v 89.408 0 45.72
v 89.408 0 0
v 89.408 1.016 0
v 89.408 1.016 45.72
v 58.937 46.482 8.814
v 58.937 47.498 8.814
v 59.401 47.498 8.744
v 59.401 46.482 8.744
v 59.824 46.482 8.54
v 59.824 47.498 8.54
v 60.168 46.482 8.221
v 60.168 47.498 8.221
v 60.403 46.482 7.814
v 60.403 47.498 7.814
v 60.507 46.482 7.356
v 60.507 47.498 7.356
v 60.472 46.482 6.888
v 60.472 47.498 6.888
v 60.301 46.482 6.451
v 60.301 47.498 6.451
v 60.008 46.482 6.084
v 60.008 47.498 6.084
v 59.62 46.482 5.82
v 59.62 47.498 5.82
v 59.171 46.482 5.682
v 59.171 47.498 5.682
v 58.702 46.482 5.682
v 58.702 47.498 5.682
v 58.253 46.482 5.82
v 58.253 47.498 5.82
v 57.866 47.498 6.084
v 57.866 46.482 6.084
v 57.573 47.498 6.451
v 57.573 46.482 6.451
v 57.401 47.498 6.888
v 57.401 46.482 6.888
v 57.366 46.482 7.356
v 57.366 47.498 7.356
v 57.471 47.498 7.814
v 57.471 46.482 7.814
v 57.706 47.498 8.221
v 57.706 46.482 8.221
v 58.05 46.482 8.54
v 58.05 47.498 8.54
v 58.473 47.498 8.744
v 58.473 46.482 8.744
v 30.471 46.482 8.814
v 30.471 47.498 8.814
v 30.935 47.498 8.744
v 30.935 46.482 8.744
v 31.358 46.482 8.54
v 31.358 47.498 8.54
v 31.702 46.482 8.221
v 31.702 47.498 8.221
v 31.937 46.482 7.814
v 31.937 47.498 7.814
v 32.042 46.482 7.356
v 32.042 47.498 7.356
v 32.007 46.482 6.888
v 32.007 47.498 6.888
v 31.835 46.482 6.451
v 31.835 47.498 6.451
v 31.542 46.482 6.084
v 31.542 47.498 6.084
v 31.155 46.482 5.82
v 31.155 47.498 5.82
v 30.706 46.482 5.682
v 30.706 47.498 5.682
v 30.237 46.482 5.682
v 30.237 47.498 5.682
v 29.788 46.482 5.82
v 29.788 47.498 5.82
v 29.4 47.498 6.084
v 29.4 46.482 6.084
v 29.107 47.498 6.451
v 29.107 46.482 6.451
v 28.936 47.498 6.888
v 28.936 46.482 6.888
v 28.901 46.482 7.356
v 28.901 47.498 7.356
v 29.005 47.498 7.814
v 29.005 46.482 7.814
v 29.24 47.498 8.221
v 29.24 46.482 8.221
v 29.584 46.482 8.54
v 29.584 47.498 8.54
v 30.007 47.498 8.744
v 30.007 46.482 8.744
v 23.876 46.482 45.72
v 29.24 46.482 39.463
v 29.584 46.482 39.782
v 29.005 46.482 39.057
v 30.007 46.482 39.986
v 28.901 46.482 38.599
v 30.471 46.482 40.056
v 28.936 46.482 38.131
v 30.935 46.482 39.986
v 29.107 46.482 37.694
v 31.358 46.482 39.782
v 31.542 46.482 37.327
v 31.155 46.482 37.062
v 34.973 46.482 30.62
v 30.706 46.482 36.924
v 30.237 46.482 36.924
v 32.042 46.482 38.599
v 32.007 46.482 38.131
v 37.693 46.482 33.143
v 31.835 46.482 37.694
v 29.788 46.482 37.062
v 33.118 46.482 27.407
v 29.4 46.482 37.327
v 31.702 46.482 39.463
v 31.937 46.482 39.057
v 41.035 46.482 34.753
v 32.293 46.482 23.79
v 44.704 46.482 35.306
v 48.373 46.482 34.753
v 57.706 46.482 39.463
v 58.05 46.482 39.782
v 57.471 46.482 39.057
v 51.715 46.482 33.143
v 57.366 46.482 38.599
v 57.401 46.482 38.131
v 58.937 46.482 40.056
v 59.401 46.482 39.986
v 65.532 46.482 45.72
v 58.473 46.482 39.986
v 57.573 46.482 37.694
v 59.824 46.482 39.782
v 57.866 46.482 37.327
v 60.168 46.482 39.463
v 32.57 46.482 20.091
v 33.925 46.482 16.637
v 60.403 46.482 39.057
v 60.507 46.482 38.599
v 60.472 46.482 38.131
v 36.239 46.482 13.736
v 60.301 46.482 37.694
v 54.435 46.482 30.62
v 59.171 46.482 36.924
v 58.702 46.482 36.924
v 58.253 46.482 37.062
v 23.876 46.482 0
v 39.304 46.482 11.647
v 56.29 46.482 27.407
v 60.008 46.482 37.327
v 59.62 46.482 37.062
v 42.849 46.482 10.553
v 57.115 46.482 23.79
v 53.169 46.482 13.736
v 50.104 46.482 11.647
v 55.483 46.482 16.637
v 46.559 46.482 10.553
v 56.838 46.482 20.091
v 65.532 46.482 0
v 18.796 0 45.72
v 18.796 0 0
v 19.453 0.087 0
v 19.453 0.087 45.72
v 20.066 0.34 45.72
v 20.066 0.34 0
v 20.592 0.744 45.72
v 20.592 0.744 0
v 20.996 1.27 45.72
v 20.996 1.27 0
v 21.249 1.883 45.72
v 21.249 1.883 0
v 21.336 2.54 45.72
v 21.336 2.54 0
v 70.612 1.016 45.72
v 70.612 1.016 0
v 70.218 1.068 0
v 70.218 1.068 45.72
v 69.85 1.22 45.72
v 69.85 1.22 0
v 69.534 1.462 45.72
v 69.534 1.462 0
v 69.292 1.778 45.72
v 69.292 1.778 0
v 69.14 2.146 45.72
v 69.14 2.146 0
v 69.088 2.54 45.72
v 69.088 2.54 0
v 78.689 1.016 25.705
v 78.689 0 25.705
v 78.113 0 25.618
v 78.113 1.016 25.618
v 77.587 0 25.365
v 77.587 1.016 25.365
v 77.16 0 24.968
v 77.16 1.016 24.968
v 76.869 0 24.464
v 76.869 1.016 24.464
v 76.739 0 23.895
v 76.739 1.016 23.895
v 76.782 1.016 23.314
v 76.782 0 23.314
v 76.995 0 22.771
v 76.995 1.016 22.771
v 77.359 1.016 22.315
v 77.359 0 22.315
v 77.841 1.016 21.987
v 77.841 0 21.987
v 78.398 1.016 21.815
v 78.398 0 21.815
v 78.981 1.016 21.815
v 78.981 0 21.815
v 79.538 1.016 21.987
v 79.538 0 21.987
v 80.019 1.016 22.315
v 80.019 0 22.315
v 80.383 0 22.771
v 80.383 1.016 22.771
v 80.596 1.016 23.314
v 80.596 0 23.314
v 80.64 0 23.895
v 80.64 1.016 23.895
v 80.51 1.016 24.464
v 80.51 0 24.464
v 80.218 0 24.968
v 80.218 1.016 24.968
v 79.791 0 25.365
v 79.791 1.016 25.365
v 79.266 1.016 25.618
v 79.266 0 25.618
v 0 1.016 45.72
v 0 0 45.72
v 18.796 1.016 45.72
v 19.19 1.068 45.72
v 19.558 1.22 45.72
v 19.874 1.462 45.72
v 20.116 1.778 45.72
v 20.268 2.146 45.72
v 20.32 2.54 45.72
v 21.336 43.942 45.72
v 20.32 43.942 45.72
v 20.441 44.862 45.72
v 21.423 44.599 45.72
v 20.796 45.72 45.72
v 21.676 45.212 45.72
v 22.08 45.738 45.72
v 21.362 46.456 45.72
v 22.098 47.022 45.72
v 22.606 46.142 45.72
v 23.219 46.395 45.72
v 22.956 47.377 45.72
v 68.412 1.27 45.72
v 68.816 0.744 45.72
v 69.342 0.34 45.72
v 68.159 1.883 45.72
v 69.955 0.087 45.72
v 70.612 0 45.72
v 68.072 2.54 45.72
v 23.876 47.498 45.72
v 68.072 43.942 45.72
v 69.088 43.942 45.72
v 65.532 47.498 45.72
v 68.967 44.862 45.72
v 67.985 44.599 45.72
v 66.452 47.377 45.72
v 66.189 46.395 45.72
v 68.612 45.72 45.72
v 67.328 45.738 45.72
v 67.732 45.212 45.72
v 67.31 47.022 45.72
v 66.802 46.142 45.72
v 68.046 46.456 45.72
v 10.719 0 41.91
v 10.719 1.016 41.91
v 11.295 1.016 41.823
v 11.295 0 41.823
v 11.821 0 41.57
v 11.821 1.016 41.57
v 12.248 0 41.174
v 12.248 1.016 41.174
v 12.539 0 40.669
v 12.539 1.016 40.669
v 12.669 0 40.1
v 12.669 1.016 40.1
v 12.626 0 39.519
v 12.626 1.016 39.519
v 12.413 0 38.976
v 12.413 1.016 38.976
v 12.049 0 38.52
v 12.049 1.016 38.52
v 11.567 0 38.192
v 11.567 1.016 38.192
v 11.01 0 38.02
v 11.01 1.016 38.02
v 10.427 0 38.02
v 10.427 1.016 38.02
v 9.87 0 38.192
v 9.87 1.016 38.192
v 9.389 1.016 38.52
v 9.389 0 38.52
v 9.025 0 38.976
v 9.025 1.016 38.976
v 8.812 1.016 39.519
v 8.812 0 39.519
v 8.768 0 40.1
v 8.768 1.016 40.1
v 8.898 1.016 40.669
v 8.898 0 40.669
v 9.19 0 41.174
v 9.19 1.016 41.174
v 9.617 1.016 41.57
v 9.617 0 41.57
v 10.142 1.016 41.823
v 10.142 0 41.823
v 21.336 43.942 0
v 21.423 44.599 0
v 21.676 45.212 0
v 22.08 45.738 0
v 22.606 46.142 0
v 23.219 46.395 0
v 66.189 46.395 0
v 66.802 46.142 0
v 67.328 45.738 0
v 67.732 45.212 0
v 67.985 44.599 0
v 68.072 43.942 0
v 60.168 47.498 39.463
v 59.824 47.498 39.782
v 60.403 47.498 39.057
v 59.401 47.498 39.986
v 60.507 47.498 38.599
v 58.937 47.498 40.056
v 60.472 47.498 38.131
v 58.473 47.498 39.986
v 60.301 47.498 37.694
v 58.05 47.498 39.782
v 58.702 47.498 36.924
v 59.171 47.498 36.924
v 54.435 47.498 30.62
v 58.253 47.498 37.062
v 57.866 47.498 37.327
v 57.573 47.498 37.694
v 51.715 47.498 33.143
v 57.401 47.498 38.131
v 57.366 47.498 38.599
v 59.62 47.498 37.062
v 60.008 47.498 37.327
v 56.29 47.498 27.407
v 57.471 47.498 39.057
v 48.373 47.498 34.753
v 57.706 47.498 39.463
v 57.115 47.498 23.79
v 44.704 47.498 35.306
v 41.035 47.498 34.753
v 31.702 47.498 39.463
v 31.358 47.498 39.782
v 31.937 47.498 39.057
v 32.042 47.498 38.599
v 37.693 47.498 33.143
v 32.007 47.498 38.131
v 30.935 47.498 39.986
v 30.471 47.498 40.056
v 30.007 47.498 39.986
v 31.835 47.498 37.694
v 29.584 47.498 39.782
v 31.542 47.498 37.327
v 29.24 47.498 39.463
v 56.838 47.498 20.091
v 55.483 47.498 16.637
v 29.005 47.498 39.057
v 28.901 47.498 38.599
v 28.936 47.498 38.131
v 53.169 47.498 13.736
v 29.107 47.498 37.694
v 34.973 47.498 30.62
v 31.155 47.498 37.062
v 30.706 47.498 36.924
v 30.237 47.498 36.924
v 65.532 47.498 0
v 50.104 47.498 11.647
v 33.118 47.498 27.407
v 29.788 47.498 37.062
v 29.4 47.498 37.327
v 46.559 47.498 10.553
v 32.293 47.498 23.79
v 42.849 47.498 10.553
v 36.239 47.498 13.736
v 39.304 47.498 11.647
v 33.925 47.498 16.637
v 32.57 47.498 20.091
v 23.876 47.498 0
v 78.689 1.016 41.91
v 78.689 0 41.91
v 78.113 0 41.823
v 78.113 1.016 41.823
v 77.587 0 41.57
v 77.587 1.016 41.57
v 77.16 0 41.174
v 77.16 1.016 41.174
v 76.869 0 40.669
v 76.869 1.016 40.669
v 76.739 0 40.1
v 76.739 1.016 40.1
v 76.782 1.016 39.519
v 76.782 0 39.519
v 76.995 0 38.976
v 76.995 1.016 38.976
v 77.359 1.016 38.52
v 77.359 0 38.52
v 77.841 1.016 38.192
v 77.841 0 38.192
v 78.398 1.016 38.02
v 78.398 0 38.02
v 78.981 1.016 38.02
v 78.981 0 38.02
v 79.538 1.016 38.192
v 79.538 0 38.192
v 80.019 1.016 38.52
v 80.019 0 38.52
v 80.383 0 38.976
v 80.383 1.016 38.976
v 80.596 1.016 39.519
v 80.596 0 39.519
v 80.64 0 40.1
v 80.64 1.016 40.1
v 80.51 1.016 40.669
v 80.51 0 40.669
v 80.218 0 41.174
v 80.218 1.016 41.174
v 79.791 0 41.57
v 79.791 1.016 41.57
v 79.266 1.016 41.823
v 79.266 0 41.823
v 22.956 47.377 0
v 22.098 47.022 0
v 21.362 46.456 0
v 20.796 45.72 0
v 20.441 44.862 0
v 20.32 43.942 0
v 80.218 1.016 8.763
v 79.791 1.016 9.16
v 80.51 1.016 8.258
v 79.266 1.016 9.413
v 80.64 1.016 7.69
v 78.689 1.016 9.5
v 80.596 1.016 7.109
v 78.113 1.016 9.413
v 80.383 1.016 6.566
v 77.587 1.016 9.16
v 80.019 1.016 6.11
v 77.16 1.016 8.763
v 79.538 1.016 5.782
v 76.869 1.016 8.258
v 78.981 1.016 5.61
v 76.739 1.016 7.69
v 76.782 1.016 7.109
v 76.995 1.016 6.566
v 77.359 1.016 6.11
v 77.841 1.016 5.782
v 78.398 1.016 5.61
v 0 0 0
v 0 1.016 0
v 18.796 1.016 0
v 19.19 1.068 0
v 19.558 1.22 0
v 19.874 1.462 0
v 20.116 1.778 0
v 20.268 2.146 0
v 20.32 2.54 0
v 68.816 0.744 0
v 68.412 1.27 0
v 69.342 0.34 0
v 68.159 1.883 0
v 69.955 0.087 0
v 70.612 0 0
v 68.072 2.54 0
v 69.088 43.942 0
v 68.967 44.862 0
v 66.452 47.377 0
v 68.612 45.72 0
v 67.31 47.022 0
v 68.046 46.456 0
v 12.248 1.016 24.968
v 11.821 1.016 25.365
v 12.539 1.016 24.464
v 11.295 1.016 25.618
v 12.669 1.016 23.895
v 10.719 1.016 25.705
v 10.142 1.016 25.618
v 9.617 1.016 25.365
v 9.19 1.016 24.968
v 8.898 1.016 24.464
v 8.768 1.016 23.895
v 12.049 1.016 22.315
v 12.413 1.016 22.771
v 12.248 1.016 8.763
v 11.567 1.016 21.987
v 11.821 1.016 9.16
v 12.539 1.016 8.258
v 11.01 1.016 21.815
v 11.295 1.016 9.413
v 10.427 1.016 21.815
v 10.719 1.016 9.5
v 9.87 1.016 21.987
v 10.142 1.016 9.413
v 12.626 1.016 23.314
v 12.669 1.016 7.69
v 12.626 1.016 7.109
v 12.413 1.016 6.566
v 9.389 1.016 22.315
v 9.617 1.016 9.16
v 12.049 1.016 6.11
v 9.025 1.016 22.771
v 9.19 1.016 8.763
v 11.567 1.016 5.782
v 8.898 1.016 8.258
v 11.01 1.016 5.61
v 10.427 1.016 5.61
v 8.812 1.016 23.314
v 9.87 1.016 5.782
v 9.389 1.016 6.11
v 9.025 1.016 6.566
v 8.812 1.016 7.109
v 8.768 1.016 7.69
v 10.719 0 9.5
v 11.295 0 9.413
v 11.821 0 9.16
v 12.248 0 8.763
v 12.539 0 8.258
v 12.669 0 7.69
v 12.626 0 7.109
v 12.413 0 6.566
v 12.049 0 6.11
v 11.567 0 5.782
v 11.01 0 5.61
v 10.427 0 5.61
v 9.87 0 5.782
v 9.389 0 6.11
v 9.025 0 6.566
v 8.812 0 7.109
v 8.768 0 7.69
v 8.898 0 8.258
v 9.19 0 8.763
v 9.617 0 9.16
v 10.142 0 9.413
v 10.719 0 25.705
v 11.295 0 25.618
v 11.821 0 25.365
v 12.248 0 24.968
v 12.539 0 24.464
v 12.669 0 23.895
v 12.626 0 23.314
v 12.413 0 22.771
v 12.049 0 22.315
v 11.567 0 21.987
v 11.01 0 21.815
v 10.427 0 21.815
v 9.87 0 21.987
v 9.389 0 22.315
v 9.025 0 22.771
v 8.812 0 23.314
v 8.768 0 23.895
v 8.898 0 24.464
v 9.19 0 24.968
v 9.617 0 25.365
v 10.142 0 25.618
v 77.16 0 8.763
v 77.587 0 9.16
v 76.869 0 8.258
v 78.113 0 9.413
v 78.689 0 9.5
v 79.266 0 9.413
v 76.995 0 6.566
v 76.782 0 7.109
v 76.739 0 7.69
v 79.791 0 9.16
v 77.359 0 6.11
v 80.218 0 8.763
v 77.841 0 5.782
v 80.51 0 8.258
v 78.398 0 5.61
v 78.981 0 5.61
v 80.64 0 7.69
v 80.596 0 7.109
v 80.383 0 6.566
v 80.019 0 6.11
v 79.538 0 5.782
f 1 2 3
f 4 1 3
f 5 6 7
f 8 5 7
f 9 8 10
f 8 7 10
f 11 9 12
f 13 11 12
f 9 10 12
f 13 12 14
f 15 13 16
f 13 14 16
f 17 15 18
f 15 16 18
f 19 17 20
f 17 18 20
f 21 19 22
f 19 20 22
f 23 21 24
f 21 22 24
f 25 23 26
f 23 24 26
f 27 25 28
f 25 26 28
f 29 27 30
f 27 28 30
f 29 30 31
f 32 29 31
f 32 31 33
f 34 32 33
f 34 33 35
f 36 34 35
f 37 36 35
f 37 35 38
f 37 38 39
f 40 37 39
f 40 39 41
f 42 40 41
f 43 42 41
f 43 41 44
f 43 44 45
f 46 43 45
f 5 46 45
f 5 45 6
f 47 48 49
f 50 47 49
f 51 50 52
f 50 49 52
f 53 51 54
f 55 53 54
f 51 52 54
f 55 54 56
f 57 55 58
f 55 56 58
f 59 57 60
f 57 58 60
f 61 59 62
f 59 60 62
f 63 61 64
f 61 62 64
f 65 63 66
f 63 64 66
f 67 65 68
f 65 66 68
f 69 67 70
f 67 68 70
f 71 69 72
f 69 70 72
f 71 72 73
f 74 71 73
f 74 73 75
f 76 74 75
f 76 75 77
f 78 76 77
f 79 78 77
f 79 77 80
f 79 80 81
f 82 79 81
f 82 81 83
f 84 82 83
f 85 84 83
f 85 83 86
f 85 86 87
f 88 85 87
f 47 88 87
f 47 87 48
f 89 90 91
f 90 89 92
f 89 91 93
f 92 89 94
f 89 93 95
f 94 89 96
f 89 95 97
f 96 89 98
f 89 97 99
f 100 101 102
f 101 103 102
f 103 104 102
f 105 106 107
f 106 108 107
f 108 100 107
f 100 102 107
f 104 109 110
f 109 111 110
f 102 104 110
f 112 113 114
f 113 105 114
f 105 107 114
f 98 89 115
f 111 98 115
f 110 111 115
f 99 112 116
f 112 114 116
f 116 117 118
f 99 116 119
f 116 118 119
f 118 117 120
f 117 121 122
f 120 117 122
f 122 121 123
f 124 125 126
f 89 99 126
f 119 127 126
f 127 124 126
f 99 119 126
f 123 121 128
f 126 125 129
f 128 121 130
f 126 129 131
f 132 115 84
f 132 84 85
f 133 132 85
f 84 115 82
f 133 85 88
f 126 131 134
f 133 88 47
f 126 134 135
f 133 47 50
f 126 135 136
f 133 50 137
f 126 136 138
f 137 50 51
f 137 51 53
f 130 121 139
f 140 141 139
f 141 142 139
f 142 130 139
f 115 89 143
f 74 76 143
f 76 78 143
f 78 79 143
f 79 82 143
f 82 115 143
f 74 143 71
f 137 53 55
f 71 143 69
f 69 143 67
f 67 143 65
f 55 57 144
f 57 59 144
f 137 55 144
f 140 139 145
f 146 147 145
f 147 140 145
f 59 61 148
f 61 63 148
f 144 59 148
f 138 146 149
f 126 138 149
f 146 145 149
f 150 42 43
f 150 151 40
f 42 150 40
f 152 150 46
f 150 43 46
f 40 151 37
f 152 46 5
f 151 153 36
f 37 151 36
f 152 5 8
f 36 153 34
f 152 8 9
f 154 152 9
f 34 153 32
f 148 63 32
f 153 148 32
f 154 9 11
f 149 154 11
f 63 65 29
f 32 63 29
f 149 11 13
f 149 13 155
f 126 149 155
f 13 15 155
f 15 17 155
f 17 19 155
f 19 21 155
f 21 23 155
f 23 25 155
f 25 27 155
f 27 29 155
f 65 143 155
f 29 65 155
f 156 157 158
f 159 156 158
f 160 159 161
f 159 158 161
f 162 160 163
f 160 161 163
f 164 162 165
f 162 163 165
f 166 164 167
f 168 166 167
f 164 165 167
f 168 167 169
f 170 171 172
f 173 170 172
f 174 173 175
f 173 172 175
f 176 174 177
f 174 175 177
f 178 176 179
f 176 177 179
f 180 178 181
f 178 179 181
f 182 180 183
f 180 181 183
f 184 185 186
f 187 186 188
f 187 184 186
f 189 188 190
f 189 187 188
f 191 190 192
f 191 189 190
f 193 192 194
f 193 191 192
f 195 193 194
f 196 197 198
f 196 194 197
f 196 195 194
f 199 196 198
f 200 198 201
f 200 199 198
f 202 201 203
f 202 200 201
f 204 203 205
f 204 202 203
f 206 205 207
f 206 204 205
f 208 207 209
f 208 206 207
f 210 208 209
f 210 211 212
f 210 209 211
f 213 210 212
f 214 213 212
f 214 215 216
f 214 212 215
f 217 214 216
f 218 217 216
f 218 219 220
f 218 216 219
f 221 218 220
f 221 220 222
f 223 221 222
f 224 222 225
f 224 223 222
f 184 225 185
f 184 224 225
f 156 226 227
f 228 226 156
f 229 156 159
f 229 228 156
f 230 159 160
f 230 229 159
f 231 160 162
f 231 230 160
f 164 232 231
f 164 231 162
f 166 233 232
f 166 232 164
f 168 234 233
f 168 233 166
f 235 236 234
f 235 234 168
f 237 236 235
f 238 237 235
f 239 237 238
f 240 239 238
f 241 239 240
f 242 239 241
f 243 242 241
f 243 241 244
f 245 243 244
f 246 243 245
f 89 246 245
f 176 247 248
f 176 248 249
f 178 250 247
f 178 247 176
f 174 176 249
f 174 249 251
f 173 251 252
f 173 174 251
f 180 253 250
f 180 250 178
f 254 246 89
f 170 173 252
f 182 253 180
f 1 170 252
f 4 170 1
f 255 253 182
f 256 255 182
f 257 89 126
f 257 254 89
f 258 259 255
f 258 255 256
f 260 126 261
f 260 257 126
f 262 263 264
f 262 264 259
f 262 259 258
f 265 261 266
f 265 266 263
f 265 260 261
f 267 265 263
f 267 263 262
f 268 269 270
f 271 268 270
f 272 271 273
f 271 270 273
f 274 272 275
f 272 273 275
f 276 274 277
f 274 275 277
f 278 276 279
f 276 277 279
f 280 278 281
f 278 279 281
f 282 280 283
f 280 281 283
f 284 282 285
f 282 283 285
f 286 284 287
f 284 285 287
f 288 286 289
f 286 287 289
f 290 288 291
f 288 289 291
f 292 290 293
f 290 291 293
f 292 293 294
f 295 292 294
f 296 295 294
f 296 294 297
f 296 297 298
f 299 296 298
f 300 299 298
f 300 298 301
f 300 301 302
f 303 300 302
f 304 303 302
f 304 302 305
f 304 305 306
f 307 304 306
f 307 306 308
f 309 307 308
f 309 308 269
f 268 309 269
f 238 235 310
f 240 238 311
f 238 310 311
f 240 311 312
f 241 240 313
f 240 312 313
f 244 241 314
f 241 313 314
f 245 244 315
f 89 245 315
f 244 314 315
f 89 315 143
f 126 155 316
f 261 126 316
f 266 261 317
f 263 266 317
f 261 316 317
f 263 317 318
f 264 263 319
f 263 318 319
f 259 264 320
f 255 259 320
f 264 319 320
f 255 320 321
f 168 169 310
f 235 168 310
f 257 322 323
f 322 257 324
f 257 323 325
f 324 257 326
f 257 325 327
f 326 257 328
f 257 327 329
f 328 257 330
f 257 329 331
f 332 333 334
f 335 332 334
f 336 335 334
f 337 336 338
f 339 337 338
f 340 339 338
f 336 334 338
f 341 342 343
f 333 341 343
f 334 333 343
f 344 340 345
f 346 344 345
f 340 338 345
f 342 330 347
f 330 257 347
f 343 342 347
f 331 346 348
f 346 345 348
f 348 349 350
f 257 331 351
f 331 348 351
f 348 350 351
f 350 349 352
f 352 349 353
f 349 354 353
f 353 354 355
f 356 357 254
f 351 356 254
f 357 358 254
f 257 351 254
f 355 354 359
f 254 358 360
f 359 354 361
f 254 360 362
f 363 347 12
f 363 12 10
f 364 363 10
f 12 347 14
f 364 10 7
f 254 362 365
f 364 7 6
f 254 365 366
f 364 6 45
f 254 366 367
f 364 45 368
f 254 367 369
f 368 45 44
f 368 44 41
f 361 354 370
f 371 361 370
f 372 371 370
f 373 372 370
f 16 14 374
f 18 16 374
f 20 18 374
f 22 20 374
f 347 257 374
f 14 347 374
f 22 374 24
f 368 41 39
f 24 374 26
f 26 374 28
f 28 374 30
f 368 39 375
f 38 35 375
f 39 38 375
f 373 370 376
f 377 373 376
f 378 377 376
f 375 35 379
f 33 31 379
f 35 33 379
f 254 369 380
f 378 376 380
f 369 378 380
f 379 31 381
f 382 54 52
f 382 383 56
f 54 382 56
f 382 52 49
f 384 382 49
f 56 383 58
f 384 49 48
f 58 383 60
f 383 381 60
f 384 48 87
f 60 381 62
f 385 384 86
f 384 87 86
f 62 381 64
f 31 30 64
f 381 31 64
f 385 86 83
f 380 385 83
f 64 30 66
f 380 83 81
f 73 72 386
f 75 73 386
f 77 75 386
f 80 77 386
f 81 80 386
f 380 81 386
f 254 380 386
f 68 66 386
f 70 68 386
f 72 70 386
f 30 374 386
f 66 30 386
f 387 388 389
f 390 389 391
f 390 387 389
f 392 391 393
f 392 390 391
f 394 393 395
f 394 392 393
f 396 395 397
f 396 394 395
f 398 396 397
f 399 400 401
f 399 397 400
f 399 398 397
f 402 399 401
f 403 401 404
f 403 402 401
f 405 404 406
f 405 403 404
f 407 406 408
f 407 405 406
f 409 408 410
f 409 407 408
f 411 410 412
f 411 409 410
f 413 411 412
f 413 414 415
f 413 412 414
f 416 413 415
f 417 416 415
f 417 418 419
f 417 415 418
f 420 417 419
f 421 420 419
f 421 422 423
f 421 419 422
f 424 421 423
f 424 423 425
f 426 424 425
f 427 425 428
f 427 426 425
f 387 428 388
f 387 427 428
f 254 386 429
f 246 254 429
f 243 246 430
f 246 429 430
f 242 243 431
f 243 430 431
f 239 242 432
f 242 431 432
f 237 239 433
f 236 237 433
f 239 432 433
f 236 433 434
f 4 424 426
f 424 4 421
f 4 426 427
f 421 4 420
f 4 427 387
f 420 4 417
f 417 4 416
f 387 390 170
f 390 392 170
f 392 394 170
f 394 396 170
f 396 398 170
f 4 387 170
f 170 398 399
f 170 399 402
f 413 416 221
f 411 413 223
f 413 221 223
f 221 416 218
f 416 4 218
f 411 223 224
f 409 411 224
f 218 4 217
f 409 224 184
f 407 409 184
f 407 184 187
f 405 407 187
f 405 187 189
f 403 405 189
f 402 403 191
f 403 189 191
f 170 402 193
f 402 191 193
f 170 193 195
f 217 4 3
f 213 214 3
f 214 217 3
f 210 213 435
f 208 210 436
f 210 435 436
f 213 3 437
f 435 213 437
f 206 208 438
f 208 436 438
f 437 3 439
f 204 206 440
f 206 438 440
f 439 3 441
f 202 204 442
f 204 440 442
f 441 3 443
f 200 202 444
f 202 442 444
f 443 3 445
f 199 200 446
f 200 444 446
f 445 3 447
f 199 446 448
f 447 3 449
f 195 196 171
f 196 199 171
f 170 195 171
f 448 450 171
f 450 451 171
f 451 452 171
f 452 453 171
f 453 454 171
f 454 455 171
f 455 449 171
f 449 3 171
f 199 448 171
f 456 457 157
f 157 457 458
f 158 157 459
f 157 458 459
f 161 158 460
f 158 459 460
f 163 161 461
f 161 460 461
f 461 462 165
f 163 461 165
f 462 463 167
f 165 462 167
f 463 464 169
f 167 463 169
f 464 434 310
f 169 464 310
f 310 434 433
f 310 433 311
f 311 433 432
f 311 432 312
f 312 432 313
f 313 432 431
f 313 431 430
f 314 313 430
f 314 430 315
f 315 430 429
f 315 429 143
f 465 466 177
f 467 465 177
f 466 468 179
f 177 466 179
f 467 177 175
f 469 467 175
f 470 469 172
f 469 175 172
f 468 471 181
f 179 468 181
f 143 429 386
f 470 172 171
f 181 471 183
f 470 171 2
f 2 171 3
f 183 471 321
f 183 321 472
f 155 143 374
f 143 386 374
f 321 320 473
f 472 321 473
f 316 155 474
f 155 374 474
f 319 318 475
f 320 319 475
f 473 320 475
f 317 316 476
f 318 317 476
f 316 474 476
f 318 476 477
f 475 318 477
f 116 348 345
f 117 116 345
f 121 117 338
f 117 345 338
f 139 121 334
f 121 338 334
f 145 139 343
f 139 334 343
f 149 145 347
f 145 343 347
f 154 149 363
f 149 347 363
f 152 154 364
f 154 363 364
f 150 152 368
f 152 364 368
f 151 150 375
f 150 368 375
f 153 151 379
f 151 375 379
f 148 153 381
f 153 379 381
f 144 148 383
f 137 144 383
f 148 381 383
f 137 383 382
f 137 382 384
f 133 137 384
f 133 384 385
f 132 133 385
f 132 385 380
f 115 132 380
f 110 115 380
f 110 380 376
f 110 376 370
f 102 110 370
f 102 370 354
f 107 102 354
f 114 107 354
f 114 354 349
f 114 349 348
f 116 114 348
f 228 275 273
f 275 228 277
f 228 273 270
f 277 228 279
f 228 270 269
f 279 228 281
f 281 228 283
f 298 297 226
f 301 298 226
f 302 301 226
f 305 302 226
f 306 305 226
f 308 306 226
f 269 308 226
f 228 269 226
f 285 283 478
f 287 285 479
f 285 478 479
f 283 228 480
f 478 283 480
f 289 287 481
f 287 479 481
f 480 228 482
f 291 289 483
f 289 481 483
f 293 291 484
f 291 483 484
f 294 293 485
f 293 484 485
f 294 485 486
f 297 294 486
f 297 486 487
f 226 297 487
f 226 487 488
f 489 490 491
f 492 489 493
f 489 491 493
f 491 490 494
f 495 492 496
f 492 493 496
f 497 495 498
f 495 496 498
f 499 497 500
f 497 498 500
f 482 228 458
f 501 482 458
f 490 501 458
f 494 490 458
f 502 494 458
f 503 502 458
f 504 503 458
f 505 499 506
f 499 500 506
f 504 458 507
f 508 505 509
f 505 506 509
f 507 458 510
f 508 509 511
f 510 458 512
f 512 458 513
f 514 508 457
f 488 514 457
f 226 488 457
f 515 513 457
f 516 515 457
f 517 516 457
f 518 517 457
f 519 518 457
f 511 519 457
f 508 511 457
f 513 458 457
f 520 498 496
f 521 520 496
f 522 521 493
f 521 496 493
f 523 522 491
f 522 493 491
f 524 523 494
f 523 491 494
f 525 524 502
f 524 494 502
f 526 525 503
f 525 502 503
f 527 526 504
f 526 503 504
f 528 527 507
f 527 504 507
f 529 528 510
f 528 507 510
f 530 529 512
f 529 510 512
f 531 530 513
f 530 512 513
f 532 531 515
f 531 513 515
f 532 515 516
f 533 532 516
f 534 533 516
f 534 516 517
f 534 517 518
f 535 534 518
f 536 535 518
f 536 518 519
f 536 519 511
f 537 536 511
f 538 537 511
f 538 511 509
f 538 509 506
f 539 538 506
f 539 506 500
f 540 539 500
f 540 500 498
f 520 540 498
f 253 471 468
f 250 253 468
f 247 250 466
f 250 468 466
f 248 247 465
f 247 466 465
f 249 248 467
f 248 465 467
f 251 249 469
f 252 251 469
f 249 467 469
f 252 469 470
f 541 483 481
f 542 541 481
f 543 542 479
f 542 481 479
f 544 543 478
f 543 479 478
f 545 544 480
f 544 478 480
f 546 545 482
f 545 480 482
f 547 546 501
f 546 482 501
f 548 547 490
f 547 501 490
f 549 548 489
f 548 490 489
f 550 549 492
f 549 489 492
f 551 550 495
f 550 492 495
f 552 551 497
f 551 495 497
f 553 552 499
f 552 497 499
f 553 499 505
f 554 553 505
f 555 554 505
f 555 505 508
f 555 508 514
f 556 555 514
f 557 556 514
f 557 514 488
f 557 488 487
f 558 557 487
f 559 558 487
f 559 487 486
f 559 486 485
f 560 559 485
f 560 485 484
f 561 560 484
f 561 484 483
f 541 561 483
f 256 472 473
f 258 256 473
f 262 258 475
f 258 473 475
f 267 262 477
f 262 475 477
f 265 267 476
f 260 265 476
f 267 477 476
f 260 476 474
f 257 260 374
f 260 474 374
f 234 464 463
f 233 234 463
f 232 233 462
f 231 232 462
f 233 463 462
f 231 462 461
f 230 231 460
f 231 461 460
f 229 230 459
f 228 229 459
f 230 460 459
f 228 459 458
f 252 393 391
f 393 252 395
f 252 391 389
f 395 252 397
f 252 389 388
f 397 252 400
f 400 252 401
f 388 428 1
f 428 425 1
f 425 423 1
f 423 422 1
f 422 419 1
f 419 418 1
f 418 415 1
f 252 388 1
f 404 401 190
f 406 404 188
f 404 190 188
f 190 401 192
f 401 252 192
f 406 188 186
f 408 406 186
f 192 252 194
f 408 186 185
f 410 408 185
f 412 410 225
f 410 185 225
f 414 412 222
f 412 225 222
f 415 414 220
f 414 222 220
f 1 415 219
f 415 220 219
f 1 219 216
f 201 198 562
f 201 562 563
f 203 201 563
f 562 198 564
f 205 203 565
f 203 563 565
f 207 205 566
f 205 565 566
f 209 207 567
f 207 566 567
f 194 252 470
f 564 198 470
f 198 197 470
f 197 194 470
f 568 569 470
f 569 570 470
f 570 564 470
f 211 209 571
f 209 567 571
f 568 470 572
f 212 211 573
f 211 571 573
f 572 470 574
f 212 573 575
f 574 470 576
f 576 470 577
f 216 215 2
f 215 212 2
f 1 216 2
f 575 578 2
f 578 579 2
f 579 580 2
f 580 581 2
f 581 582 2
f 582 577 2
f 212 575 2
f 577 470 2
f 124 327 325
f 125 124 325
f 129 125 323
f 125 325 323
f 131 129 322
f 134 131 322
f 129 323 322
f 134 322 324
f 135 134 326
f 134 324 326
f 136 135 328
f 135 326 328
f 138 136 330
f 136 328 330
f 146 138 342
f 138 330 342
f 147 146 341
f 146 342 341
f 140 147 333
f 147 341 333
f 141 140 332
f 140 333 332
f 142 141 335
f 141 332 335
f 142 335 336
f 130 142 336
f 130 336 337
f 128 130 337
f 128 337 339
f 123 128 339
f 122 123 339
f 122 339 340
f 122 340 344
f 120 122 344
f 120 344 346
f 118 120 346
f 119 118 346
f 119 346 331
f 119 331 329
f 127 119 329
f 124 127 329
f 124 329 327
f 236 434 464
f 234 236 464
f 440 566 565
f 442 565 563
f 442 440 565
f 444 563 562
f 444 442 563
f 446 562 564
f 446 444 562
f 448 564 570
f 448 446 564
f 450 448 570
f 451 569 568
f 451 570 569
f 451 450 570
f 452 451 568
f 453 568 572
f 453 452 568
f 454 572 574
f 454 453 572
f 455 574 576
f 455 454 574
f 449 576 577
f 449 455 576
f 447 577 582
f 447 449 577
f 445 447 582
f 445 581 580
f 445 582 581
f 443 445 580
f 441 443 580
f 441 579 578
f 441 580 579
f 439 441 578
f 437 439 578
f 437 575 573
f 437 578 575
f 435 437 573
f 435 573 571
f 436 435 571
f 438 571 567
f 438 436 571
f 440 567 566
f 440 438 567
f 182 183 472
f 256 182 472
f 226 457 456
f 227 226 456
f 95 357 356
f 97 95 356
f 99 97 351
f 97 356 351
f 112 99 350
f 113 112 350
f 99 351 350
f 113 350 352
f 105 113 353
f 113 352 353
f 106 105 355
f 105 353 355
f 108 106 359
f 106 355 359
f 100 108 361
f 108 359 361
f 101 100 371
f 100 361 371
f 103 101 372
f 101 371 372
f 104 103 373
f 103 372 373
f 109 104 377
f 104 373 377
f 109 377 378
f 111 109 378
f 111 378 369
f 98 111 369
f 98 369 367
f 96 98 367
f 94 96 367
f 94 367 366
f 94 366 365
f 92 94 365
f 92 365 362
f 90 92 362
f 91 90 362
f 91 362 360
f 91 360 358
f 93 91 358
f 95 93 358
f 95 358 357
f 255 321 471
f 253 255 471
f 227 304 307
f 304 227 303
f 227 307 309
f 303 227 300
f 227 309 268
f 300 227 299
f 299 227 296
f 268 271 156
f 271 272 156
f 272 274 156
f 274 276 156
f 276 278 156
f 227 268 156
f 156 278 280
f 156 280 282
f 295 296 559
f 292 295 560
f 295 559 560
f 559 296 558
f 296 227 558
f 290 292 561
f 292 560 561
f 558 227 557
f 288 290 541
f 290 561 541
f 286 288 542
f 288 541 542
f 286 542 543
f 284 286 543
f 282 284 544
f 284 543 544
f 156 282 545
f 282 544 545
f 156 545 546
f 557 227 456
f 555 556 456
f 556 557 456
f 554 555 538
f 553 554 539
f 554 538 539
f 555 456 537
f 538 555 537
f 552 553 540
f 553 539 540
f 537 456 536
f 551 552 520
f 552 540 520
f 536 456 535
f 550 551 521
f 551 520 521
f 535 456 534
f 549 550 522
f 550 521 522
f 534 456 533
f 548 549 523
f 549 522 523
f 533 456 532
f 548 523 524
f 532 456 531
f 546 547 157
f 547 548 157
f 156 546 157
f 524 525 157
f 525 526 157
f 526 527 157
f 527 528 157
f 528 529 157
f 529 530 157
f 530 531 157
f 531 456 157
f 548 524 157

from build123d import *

# Parameters (mm, degrees)
BOSS_EXTRUDE1_DEPTH = 45.72
SKETCH2_R           = 12.446
CUT_EXTRUDE1_DEPTH  = 112.086312694
SKETCH3_R           = 1.5748
CUT_EXTRUDE2_DEPTH  = 112.086312694
SKETCH4_R           = 1.9558
CUT_EXTRUDE3_DEPTH  = 45.72


with BuildPart() as part:
    # Sketch1 → Boss-Extrude1 (new body)
    with BuildSketch(Plane.XY):
        with BuildLine():
            Line((0, 0), (18.796, 0))
            ThreePointArc((18.796, 0), (20.592051224, 0.743948776), (21.336, 2.54))
            Line((21.336, 2.54), (21.336, 43.942))
            ThreePointArc((21.336, 43.942), (22.079948776, 45.738051224), (23.876, 46.482))
            Line((23.876, 46.482), (65.532, 46.482))
            ThreePointArc((65.532, 46.482), (67.328051224, 45.738051224), (68.072, 43.942))
            Line((68.072, 43.942), (68.072, 2.54))
            ThreePointArc((68.072, 2.54), (68.815948776, 0.743948776), (70.612, 0))
            Line((70.612, 0), (89.408, 0))
            Line((89.408, 0), (89.408, 1.016))
            Line((89.408, 1.016), (70.612, 1.016))
            ThreePointArc((70.612, 1.016), (69.534369265, 1.462369265), (69.088, 2.54))
            Line((69.088, 2.54), (69.088, 43.942))
            ThreePointArc((69.088, 43.942), (68.046471714, 46.456471714), (65.532, 47.498))
            Line((65.532, 47.498), (23.876, 47.498))
            ThreePointArc((23.876, 47.498), (21.361528286, 46.456471714), (20.32, 43.942))
            Line((20.32, 43.942), (20.32, 2.54))
            ThreePointArc((20.32, 2.54), (19.873630735, 1.462369265), (18.796, 1.016))
            Line((18.796, 1.016), (0, 1.016))
            Line((0, 1.016), (0, 0))
        make_face()
    extrude(amount=BOSS_EXTRUDE1_DEPTH)

    # Sketch2 → Cut-Extrude1 (cut, through all)
    with BuildSketch(Plane(origin=(0, 47.498, 0), x_dir=(1, 0, 0), z_dir=(0, 1, 0))):
        with Locations(Location((44.704, -22.86, 0), (0, 0, 270))):
            Circle(SKETCH2_R)
    extrude(amount=-CUT_EXTRUDE1_DEPTH, mode=Mode.SUBTRACT)

    # Sketch3 → Cut-Extrude2 (cut, through all)
    with BuildSketch(Plane(origin=(0, 47.498, 0), x_dir=(1, 0, 0), z_dir=(0, 1, 0))):
        with Locations(Location((58.936729391, -7.238711644, 0), (0, 0, 270))):
            Circle(SKETCH3_R)
        with Locations(Location((30.471270609, -7.238711644, 0), (0, 0, 270))):
            Circle(SKETCH3_R)
        with Locations(Location((58.936729391, -38.481288356, 0), (0, 0, 270))):
            Circle(SKETCH3_R)
        with Locations(Location((30.471270609, -38.481288356, 0), (0, 0, 270))):
            Circle(SKETCH3_R)
    extrude(amount=-CUT_EXTRUDE2_DEPTH, mode=Mode.SUBTRACT)

    # Sketch4 → Cut-Extrude3 (cut)
    with BuildSketch(Plane(origin=(0, 1.016, 0), x_dir=(1, 0, 0), z_dir=(0, 1, 0))):
        with Locations(Location((10.7188, -7.5438, 0), (0, 0, 270))):
            Circle(SKETCH4_R)
        with Locations(Location((10.7188, -23.749, 0), (0, 0, 270))):
            Circle(SKETCH4_R)
        with Locations(Location((10.7188, -39.9542, 0), (0, 0, 270))):
            Circle(SKETCH4_R)
    cut_extrude3 = extrude(amount=-CUT_EXTRUDE3_DEPTH, mode=Mode.SUBTRACT)

    # Mirror1: Cut-Extrude3 across plane
    add(cut_extrude3.mirror(Plane.ZY.offset(-44.704)), mode=Mode.SUBTRACT)


solid = part.part
